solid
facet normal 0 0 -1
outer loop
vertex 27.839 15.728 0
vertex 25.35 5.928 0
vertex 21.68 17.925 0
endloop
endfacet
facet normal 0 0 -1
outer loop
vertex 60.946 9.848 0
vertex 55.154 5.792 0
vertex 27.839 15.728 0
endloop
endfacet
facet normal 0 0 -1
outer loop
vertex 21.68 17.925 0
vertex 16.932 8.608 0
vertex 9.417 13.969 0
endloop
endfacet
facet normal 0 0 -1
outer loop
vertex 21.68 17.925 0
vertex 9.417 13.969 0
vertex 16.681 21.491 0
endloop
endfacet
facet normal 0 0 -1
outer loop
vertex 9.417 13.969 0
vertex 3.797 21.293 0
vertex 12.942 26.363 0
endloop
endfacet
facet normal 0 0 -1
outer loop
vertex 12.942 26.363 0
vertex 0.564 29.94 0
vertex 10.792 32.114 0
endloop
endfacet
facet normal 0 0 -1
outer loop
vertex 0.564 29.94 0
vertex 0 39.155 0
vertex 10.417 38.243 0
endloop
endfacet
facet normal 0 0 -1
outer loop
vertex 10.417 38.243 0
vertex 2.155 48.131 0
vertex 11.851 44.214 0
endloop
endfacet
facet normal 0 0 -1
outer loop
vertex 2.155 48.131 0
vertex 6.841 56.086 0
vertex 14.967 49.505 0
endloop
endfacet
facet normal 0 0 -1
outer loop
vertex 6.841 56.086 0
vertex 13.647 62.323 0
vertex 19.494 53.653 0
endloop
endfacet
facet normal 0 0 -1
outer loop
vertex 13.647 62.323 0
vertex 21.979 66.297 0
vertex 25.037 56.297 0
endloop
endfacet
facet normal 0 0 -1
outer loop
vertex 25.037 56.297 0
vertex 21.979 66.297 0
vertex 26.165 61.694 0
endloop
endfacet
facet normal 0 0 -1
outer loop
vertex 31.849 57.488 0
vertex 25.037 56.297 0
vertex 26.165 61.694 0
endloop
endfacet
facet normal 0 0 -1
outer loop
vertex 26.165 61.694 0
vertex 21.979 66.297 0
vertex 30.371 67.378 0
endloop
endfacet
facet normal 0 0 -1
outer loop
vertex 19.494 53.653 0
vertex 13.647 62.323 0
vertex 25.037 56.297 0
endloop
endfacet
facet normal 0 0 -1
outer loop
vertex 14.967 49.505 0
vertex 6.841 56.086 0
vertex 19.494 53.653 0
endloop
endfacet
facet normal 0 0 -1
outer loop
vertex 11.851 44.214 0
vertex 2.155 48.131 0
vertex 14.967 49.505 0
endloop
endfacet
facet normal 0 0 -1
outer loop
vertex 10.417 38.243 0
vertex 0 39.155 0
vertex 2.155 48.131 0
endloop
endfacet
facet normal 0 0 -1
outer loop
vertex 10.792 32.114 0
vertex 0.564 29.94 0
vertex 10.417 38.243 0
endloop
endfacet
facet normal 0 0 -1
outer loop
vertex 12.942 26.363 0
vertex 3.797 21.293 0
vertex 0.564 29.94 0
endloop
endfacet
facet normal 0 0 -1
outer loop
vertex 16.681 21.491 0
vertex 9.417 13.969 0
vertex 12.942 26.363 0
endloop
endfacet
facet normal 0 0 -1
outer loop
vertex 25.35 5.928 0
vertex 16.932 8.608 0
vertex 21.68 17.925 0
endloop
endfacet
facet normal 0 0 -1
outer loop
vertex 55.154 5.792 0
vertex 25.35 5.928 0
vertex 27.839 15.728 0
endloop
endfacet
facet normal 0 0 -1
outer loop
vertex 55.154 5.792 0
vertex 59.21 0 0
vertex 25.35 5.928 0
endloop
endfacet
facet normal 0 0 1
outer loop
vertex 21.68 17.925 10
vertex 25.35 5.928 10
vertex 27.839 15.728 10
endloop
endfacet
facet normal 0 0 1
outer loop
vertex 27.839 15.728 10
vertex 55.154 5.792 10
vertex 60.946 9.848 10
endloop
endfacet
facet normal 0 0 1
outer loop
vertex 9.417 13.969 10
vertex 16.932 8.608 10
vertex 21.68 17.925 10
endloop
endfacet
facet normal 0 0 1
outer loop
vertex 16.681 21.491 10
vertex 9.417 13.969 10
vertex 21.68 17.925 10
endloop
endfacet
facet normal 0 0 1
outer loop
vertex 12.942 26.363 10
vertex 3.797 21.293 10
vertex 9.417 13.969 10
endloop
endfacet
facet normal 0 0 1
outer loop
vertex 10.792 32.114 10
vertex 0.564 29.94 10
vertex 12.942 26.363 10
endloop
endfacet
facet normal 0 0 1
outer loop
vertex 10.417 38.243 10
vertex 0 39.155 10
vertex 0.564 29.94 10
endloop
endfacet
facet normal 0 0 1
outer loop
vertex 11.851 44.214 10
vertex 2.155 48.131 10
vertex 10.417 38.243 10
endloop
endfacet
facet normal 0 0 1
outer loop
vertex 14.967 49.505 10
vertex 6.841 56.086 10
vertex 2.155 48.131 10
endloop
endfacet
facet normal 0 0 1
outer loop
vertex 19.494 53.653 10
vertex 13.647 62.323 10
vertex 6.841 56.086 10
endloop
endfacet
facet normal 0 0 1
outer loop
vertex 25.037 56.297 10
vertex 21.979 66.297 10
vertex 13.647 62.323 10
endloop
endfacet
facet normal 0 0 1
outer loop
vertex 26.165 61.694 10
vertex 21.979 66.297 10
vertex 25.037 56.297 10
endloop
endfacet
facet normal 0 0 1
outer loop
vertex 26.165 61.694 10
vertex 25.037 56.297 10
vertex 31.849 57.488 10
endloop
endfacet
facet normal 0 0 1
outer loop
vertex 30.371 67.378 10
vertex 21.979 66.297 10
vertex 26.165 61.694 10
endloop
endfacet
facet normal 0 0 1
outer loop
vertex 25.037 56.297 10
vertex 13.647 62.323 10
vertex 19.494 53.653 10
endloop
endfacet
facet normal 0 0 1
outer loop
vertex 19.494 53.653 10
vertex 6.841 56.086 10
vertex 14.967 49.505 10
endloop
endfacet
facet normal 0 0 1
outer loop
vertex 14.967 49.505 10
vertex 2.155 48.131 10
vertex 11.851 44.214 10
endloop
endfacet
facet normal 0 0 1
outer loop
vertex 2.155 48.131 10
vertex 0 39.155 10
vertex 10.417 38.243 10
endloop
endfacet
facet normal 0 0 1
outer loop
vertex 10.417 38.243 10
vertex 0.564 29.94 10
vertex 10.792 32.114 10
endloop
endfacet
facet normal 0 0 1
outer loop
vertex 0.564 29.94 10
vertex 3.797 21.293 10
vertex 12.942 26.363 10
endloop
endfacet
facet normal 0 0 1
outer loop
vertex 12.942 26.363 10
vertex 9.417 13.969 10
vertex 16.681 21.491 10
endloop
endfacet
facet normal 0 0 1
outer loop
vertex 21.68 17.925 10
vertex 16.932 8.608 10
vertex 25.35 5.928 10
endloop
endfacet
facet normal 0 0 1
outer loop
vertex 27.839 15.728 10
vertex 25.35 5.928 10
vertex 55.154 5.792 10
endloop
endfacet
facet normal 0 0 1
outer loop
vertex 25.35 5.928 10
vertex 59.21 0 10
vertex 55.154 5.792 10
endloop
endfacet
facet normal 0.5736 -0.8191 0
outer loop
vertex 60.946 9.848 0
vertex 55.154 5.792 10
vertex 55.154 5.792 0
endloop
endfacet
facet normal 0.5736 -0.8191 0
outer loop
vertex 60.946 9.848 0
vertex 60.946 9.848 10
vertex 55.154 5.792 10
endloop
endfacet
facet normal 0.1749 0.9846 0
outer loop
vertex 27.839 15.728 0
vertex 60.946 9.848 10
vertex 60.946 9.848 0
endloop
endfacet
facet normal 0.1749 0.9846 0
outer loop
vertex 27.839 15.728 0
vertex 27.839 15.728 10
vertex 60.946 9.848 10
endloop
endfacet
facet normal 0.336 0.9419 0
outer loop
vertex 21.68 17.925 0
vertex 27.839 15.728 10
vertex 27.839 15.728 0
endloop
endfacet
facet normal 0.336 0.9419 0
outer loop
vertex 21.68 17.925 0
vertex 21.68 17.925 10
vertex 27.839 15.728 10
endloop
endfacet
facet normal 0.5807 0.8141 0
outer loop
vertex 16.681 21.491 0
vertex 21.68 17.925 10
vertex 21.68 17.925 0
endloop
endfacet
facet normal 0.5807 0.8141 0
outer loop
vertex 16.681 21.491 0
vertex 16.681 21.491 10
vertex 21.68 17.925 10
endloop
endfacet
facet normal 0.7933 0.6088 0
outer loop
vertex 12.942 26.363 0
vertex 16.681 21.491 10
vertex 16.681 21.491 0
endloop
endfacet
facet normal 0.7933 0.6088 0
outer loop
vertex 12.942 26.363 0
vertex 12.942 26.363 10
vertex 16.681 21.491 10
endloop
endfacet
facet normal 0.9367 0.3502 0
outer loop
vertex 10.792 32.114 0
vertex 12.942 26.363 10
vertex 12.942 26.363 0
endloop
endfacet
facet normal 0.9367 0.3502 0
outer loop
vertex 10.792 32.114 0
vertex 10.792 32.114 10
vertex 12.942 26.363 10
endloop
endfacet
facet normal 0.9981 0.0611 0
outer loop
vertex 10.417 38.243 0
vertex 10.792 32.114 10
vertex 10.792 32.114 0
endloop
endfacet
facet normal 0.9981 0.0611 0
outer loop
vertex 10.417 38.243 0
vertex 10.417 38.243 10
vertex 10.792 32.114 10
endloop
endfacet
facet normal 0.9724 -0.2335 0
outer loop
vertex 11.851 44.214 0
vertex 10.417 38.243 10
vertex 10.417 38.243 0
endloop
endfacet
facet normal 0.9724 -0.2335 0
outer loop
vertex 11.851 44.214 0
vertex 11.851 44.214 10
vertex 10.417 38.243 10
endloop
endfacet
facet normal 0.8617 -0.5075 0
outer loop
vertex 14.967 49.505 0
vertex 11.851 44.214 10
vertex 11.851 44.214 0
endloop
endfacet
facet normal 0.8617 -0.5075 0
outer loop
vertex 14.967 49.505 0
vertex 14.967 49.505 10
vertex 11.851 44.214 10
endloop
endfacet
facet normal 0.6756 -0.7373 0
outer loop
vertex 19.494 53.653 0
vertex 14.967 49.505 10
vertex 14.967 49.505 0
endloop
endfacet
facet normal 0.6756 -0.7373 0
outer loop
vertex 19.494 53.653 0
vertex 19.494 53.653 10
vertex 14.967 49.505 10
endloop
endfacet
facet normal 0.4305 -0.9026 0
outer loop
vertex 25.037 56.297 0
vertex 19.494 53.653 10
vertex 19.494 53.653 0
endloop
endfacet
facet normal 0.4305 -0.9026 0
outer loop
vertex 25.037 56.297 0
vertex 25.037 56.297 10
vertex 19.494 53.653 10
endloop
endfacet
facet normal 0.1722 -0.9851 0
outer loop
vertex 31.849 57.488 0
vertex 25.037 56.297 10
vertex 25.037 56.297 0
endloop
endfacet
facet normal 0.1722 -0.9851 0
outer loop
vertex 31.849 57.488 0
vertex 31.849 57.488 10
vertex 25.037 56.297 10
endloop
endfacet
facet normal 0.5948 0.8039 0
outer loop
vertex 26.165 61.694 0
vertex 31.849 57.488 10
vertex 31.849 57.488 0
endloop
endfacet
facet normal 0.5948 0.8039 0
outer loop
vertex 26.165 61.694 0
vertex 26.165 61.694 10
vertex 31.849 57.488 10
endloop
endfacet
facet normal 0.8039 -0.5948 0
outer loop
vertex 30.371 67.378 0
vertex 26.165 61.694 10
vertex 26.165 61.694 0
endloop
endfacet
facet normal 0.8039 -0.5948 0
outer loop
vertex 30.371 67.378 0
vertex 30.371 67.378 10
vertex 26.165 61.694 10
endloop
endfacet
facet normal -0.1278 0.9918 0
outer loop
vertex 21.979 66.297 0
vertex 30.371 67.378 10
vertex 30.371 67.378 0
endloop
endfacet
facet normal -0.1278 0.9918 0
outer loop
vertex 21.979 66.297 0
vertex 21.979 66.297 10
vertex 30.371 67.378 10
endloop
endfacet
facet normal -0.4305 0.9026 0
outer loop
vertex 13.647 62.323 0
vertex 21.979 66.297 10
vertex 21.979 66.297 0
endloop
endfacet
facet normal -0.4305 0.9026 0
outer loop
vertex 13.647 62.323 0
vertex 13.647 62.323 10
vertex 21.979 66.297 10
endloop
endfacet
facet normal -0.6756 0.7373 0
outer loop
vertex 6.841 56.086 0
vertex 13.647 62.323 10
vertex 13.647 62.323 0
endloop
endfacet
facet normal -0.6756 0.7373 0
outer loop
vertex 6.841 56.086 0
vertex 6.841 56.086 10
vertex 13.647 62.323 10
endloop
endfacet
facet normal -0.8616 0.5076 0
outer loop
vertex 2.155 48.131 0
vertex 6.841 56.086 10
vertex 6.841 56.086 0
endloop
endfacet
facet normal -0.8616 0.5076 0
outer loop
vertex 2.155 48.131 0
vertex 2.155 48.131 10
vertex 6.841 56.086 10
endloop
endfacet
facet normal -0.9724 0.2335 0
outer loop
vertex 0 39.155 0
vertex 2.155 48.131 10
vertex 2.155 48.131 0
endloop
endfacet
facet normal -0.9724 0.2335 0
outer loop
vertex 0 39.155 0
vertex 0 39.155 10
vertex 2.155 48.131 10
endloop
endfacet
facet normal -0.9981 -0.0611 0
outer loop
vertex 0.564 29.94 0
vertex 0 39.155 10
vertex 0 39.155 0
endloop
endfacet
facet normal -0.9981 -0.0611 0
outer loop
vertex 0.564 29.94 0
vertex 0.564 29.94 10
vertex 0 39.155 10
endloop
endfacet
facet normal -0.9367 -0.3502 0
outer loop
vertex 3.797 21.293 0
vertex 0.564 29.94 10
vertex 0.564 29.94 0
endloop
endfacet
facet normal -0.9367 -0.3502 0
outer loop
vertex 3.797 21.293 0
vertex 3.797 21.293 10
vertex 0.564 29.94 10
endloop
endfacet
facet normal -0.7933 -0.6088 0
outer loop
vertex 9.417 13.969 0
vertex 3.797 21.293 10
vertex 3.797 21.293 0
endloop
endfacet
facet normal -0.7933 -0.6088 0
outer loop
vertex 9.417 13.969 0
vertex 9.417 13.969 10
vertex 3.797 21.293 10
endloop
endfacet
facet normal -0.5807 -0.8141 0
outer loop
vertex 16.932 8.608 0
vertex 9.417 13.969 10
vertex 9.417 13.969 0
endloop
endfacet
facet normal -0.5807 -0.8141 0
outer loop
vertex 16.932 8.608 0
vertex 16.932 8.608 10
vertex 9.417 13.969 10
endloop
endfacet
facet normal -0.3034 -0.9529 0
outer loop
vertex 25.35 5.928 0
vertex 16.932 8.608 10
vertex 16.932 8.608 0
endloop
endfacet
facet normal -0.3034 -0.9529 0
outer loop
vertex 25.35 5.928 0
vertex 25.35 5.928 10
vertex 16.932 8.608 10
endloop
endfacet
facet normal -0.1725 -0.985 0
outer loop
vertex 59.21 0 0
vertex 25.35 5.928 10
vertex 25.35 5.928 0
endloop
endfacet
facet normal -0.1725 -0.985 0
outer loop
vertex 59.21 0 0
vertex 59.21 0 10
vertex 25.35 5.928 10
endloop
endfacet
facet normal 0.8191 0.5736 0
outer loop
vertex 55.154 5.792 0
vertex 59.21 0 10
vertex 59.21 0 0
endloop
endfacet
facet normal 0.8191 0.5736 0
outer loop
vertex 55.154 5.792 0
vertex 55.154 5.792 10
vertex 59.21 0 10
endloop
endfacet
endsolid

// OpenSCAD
$fn = 32;

// ----------------------------------------------------------------------
// Hook plate: curl radius 26 mm over 170 degrees, 10 mm thick band
// ----------------------------------------------------------------------

// --- parameters (mm) ---
profile_height = 10;      // extrusion height
profile_points = 26;      // points of the closed outline

profile = [[26.165, 61.694], [30.371, 67.378], [21.979, 66.297], [13.647, 62.323], [6.841, 56.086], [2.155, 48.131], [0, 39.155], [0.564, 29.94], [3.797, 21.293], [9.417, 13.969], [16.932, 8.608], [25.35, 5.928], [59.21, 0], [55.154, 5.792], [60.946, 9.848], [27.839, 15.728], [21.68, 17.925], [16.681, 21.491], [12.942, 26.363], [10.792, 32.114], [10.417, 38.243], [11.851, 44.214], [14.967, 49.505], [19.494, 53.653], [25.037, 56.297], [31.849, 57.488]];  // single closed polygon, 26 points, counter clockwise

// --- the one profile operation ---
linear_extrude(height = profile_height) polygon(points = profile);
